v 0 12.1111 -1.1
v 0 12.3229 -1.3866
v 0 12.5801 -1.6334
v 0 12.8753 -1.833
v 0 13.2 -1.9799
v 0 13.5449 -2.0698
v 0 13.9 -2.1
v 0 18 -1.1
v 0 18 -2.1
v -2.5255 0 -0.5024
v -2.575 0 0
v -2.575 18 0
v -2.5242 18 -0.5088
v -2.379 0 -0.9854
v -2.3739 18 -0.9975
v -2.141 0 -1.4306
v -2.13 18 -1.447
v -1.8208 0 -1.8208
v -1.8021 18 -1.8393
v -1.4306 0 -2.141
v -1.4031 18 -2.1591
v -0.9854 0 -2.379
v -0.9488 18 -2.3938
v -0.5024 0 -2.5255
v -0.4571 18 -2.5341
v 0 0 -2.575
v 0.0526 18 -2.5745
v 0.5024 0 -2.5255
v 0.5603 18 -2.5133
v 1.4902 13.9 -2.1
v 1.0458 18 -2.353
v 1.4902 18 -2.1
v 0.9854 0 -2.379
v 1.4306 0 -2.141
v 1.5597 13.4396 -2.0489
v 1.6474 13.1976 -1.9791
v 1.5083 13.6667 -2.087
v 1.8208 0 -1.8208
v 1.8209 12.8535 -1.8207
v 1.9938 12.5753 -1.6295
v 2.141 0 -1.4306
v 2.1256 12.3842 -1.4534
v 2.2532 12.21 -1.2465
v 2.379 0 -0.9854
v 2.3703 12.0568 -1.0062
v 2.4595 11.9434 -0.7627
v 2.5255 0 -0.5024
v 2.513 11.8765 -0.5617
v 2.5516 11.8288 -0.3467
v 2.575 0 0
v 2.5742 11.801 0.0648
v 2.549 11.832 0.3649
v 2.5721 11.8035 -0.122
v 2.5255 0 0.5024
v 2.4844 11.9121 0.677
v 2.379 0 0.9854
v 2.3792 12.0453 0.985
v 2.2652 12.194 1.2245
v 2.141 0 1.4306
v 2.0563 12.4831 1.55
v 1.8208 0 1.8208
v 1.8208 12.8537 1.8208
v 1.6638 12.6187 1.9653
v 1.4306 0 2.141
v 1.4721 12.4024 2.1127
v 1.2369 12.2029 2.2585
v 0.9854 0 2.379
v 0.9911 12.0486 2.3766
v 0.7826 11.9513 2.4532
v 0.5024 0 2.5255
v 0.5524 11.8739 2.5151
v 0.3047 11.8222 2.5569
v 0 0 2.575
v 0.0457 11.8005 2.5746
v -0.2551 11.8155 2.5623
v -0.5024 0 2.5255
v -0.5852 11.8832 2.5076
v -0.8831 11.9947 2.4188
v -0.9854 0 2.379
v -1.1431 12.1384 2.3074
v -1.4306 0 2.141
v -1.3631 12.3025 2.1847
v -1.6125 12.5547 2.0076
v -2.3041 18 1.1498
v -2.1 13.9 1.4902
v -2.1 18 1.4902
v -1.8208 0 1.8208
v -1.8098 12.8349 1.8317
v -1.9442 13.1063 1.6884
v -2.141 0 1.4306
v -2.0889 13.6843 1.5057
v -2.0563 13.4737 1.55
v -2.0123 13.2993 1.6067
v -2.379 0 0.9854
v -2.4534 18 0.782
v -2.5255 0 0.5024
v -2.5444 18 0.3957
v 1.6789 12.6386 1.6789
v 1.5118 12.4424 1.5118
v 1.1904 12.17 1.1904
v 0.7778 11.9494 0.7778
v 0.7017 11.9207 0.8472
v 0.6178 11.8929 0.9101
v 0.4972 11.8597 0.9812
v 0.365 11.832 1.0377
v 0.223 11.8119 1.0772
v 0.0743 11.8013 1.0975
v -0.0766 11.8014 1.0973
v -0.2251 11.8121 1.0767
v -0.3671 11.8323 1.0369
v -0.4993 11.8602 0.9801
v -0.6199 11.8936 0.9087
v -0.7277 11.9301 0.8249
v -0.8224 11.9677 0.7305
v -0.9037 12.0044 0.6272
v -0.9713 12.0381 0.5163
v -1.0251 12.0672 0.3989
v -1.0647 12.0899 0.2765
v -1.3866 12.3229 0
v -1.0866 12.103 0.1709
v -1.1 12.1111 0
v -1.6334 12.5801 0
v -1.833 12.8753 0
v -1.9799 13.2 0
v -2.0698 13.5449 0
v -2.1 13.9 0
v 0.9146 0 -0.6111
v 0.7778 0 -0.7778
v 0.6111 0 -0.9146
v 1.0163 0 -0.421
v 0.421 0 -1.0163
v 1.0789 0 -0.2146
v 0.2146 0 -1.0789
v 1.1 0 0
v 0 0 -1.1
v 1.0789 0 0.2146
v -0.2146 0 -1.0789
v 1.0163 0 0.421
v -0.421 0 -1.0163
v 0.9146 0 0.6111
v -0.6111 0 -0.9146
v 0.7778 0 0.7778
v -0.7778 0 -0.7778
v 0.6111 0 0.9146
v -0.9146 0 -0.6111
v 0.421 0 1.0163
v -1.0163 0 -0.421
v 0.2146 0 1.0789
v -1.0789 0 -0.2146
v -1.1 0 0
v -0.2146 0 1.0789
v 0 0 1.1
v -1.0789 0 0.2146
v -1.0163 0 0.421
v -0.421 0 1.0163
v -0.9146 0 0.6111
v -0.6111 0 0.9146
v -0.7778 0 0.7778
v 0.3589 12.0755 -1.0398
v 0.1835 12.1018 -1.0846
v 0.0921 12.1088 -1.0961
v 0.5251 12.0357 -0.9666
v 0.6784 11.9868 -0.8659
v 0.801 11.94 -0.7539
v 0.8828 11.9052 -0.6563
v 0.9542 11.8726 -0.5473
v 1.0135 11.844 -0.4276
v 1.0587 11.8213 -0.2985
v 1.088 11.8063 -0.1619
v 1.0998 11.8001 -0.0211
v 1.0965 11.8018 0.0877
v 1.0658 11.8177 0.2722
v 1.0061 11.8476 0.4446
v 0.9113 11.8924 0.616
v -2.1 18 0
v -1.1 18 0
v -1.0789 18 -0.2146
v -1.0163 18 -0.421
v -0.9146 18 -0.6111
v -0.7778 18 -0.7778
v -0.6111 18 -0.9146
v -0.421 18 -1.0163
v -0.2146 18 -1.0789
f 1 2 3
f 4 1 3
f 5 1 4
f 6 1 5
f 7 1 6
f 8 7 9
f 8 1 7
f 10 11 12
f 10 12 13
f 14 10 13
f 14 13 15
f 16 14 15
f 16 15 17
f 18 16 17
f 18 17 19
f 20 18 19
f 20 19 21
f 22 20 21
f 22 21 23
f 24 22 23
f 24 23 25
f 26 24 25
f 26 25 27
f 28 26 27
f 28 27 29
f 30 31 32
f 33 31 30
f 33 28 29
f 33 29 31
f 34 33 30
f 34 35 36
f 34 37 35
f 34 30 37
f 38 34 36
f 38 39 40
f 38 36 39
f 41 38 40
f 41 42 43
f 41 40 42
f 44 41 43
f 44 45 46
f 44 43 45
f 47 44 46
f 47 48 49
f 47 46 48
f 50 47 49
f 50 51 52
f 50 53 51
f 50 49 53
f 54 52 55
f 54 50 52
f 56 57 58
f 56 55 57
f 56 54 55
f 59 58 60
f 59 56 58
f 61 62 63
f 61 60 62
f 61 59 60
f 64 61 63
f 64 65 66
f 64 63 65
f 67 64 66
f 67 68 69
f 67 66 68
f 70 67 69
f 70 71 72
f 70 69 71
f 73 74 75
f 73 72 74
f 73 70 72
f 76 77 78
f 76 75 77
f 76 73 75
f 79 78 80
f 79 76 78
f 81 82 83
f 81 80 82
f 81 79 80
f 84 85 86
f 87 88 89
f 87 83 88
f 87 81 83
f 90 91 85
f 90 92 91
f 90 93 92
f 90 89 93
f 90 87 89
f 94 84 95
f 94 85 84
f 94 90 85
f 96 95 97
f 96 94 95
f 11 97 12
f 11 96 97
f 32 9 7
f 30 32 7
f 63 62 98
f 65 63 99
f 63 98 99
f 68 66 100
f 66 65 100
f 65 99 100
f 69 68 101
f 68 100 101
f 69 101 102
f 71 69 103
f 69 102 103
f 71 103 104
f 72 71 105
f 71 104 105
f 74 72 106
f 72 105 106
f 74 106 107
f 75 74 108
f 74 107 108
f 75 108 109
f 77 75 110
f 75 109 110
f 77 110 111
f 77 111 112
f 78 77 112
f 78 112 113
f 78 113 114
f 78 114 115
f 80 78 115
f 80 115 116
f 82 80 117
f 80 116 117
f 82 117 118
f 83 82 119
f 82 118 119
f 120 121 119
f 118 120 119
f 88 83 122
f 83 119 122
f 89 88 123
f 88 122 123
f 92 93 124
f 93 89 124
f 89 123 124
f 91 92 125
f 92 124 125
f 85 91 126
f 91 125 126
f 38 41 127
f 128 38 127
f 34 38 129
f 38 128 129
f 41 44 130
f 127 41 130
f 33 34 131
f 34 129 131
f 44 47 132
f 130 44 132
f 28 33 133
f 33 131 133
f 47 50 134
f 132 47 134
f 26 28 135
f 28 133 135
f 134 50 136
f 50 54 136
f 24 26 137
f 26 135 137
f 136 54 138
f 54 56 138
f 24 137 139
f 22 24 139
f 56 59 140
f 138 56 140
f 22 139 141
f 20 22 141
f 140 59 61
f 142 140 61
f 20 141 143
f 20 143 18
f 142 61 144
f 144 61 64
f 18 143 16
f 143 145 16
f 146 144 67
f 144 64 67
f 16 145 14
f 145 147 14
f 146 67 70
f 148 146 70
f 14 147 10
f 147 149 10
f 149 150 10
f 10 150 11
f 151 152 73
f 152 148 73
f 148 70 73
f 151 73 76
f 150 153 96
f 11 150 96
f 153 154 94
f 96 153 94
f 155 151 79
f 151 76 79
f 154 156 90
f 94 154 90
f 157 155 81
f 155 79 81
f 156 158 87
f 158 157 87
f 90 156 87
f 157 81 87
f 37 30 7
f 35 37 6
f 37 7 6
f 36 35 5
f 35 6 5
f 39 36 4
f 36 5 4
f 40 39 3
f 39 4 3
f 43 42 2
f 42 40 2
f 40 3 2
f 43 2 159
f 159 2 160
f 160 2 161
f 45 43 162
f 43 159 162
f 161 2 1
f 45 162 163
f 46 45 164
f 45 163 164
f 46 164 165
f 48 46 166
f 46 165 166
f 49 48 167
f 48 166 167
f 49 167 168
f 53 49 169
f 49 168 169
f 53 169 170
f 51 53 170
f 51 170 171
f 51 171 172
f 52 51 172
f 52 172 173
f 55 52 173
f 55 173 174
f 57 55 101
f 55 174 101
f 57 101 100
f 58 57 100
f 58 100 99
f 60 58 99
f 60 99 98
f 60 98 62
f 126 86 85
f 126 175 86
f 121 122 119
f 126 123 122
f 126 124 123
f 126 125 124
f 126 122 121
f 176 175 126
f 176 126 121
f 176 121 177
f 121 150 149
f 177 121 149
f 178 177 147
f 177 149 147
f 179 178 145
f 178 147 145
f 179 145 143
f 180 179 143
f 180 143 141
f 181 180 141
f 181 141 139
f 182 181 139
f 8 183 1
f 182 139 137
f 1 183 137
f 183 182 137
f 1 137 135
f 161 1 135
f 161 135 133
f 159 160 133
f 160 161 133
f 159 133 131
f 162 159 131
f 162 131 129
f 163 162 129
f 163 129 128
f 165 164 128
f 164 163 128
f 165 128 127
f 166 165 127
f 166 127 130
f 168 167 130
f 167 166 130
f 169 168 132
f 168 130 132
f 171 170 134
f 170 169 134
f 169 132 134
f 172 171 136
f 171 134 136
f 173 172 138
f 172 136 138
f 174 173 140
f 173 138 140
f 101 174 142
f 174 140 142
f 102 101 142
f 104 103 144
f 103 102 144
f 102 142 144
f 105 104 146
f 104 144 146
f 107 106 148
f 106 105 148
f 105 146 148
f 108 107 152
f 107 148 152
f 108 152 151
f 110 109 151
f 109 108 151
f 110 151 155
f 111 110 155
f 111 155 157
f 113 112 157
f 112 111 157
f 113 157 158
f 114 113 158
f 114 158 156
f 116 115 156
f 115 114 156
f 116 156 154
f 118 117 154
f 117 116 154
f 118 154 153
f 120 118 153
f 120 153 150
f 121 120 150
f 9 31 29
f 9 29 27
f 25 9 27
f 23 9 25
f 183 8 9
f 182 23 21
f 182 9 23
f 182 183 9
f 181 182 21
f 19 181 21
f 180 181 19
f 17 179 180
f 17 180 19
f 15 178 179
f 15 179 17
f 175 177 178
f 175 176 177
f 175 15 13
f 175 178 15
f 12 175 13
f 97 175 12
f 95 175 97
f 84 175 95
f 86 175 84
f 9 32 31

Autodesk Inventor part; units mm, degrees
ref_plane "XZ Plane" through (0, 0, 0) normal (0, 1, 0) x (-1, 0, 0)
ref_plane "XY Plane" through (0, 0, 0) normal (0, 0, 1) x (1, 0, 0)
sketch "Sketch1" plane through (0, 0, 0) normal (0, 1, 0) x (-1, 0, 0)
  circle A0 centre (0, 0) radius 1.1
  circle A1 centre (0, 0) radius 2.575
  dimension "d0" = 2.2
  dimension "d1" = 5.15
extrude "Extrusion1" add sketch "Sketch1" along normal blind 18
sketch "Sketch2" plane through (0, 0, 0) normal (0, 0, 1) x (1, 0, 0)
  line L0 (2.575, 18) -> (-2.575, 18) projected
  line L1 (2.575, 0) -> (-2.575, 0) projected
  line L2 (-2.575, 0) -> (-2.575, 18) projected
  line L3 (-2.575, 16) -> (2.5173, 16)
  line L4 (2.575, 18) -> (-2.575, 18) projected
  line L5 (0, 18) -> (0, 0)
  circle A0 centre (0, 13.9) radius 2.1
  line L6 (-2.1, 13.9) -> (2.1, 13.9)
  line L7 (2.1, 13.9) -> (2.1, 18)
  line L8 (2.1, 18) -> (-2.1, 18)
  line L9 (-2.1, 18) -> (-2.1, 13.9)
  point P0 (2.1, 16)
  point P1 (-2.1, 16)
  point P2 (0, 16)
  dimension "d5" = 4.2
  dimension "d4" = 2
extrude "Extrusion2" cut sketch "Sketch2" along normal blind 12 contours L7 L3 L5 L0 | L5 L3 L9 L0 | L7 A0 L3 | A0 L9 L3 | A0 L6 L5 | L5 L6 A0 | A0 L5 L6 | L5 A0 L6
sketch "Sketch3" plane through (0, 0, 0) normal (1, 0, 0) x (0, 1, 0)
  line L0 (0, -2.575) -> (0, 2.575) projected
  line L1 (0, 2.575) -> (11.8, 2.575) projected
  line L2 (16, 2.575) -> (16, -2.525)
  line L3 (18, 1.1) -> (18, -1.1) projected
  line L4 (18, 0) -> (0, 0)
  circle A0 centre (13.9, 0) radius 2.1
  line L5 (13.9, 1.4902) -> (18, 1.4902) projected
  line L6 (18, 1.4902) -> (13.9, 1.4902) projected
  line L7 (13.9, 2.1) -> (18, 2.1)
  line L8 (18, 2.1) -> (18, -2.1)
  line L9 (18, -2.1) -> (13.9, -2.1)
  line L10 (13.9, -2.1) -> (13.9, 2.1)
  point P0 (18, -2.575)
  point P1 (18, 2.575)
  dimension "d9" = 4.2
  dimension "d8" = 2
extrude "Extrusion3" cut sketch "Sketch3" along normal up to next
properties part number "motor_shaft_adapter"
